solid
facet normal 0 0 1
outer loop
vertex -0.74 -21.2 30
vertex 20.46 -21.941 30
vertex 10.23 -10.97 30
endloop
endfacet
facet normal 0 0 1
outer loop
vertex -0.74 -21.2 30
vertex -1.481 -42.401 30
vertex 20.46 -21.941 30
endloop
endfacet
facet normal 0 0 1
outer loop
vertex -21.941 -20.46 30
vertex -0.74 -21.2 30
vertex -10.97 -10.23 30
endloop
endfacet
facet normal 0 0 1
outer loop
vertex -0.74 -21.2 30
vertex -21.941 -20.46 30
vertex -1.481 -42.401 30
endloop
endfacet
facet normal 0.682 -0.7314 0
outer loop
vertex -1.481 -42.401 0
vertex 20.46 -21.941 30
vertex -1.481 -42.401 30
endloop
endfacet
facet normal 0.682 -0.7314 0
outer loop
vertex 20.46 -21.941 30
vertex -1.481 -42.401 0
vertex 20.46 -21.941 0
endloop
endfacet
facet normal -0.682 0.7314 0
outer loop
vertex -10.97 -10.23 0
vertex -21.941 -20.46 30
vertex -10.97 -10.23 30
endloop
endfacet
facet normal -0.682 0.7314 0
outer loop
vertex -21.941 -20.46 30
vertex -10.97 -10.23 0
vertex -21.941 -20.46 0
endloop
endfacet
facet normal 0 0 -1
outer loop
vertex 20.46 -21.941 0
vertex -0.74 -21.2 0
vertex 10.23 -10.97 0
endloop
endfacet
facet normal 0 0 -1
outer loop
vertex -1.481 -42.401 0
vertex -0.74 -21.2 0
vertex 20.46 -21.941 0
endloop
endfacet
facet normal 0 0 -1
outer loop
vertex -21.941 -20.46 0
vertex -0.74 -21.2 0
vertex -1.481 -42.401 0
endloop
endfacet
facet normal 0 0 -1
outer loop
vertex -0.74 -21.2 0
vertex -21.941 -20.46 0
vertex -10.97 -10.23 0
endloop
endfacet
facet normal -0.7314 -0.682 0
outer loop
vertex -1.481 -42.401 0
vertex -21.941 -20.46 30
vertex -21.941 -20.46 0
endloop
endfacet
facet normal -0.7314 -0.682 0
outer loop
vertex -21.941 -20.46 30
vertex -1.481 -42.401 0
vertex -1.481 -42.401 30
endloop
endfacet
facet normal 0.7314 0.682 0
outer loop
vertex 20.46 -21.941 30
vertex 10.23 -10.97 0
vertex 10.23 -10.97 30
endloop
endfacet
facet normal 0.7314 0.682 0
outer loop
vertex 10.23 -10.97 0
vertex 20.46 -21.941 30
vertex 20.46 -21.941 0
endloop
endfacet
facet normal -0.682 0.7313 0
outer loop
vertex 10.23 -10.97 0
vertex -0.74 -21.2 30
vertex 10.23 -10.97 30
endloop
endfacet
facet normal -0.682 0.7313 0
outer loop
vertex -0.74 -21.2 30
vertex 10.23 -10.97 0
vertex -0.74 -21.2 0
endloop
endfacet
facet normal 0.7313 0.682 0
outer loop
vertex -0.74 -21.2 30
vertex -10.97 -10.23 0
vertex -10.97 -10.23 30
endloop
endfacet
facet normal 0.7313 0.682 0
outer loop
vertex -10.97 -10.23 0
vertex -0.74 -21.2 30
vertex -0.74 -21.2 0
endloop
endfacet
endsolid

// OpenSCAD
rotate([0,0,178])
rotate([0,-90,0]){
    difference(){
        rotate([-45,0,0]) {
            cube([30, 30, 30]);
        }
        scale([1,0.5,0.5]) {
            rotate([-45,0,0]) {
                cube([30, 30, 30]);
            }
        }
    }
}
